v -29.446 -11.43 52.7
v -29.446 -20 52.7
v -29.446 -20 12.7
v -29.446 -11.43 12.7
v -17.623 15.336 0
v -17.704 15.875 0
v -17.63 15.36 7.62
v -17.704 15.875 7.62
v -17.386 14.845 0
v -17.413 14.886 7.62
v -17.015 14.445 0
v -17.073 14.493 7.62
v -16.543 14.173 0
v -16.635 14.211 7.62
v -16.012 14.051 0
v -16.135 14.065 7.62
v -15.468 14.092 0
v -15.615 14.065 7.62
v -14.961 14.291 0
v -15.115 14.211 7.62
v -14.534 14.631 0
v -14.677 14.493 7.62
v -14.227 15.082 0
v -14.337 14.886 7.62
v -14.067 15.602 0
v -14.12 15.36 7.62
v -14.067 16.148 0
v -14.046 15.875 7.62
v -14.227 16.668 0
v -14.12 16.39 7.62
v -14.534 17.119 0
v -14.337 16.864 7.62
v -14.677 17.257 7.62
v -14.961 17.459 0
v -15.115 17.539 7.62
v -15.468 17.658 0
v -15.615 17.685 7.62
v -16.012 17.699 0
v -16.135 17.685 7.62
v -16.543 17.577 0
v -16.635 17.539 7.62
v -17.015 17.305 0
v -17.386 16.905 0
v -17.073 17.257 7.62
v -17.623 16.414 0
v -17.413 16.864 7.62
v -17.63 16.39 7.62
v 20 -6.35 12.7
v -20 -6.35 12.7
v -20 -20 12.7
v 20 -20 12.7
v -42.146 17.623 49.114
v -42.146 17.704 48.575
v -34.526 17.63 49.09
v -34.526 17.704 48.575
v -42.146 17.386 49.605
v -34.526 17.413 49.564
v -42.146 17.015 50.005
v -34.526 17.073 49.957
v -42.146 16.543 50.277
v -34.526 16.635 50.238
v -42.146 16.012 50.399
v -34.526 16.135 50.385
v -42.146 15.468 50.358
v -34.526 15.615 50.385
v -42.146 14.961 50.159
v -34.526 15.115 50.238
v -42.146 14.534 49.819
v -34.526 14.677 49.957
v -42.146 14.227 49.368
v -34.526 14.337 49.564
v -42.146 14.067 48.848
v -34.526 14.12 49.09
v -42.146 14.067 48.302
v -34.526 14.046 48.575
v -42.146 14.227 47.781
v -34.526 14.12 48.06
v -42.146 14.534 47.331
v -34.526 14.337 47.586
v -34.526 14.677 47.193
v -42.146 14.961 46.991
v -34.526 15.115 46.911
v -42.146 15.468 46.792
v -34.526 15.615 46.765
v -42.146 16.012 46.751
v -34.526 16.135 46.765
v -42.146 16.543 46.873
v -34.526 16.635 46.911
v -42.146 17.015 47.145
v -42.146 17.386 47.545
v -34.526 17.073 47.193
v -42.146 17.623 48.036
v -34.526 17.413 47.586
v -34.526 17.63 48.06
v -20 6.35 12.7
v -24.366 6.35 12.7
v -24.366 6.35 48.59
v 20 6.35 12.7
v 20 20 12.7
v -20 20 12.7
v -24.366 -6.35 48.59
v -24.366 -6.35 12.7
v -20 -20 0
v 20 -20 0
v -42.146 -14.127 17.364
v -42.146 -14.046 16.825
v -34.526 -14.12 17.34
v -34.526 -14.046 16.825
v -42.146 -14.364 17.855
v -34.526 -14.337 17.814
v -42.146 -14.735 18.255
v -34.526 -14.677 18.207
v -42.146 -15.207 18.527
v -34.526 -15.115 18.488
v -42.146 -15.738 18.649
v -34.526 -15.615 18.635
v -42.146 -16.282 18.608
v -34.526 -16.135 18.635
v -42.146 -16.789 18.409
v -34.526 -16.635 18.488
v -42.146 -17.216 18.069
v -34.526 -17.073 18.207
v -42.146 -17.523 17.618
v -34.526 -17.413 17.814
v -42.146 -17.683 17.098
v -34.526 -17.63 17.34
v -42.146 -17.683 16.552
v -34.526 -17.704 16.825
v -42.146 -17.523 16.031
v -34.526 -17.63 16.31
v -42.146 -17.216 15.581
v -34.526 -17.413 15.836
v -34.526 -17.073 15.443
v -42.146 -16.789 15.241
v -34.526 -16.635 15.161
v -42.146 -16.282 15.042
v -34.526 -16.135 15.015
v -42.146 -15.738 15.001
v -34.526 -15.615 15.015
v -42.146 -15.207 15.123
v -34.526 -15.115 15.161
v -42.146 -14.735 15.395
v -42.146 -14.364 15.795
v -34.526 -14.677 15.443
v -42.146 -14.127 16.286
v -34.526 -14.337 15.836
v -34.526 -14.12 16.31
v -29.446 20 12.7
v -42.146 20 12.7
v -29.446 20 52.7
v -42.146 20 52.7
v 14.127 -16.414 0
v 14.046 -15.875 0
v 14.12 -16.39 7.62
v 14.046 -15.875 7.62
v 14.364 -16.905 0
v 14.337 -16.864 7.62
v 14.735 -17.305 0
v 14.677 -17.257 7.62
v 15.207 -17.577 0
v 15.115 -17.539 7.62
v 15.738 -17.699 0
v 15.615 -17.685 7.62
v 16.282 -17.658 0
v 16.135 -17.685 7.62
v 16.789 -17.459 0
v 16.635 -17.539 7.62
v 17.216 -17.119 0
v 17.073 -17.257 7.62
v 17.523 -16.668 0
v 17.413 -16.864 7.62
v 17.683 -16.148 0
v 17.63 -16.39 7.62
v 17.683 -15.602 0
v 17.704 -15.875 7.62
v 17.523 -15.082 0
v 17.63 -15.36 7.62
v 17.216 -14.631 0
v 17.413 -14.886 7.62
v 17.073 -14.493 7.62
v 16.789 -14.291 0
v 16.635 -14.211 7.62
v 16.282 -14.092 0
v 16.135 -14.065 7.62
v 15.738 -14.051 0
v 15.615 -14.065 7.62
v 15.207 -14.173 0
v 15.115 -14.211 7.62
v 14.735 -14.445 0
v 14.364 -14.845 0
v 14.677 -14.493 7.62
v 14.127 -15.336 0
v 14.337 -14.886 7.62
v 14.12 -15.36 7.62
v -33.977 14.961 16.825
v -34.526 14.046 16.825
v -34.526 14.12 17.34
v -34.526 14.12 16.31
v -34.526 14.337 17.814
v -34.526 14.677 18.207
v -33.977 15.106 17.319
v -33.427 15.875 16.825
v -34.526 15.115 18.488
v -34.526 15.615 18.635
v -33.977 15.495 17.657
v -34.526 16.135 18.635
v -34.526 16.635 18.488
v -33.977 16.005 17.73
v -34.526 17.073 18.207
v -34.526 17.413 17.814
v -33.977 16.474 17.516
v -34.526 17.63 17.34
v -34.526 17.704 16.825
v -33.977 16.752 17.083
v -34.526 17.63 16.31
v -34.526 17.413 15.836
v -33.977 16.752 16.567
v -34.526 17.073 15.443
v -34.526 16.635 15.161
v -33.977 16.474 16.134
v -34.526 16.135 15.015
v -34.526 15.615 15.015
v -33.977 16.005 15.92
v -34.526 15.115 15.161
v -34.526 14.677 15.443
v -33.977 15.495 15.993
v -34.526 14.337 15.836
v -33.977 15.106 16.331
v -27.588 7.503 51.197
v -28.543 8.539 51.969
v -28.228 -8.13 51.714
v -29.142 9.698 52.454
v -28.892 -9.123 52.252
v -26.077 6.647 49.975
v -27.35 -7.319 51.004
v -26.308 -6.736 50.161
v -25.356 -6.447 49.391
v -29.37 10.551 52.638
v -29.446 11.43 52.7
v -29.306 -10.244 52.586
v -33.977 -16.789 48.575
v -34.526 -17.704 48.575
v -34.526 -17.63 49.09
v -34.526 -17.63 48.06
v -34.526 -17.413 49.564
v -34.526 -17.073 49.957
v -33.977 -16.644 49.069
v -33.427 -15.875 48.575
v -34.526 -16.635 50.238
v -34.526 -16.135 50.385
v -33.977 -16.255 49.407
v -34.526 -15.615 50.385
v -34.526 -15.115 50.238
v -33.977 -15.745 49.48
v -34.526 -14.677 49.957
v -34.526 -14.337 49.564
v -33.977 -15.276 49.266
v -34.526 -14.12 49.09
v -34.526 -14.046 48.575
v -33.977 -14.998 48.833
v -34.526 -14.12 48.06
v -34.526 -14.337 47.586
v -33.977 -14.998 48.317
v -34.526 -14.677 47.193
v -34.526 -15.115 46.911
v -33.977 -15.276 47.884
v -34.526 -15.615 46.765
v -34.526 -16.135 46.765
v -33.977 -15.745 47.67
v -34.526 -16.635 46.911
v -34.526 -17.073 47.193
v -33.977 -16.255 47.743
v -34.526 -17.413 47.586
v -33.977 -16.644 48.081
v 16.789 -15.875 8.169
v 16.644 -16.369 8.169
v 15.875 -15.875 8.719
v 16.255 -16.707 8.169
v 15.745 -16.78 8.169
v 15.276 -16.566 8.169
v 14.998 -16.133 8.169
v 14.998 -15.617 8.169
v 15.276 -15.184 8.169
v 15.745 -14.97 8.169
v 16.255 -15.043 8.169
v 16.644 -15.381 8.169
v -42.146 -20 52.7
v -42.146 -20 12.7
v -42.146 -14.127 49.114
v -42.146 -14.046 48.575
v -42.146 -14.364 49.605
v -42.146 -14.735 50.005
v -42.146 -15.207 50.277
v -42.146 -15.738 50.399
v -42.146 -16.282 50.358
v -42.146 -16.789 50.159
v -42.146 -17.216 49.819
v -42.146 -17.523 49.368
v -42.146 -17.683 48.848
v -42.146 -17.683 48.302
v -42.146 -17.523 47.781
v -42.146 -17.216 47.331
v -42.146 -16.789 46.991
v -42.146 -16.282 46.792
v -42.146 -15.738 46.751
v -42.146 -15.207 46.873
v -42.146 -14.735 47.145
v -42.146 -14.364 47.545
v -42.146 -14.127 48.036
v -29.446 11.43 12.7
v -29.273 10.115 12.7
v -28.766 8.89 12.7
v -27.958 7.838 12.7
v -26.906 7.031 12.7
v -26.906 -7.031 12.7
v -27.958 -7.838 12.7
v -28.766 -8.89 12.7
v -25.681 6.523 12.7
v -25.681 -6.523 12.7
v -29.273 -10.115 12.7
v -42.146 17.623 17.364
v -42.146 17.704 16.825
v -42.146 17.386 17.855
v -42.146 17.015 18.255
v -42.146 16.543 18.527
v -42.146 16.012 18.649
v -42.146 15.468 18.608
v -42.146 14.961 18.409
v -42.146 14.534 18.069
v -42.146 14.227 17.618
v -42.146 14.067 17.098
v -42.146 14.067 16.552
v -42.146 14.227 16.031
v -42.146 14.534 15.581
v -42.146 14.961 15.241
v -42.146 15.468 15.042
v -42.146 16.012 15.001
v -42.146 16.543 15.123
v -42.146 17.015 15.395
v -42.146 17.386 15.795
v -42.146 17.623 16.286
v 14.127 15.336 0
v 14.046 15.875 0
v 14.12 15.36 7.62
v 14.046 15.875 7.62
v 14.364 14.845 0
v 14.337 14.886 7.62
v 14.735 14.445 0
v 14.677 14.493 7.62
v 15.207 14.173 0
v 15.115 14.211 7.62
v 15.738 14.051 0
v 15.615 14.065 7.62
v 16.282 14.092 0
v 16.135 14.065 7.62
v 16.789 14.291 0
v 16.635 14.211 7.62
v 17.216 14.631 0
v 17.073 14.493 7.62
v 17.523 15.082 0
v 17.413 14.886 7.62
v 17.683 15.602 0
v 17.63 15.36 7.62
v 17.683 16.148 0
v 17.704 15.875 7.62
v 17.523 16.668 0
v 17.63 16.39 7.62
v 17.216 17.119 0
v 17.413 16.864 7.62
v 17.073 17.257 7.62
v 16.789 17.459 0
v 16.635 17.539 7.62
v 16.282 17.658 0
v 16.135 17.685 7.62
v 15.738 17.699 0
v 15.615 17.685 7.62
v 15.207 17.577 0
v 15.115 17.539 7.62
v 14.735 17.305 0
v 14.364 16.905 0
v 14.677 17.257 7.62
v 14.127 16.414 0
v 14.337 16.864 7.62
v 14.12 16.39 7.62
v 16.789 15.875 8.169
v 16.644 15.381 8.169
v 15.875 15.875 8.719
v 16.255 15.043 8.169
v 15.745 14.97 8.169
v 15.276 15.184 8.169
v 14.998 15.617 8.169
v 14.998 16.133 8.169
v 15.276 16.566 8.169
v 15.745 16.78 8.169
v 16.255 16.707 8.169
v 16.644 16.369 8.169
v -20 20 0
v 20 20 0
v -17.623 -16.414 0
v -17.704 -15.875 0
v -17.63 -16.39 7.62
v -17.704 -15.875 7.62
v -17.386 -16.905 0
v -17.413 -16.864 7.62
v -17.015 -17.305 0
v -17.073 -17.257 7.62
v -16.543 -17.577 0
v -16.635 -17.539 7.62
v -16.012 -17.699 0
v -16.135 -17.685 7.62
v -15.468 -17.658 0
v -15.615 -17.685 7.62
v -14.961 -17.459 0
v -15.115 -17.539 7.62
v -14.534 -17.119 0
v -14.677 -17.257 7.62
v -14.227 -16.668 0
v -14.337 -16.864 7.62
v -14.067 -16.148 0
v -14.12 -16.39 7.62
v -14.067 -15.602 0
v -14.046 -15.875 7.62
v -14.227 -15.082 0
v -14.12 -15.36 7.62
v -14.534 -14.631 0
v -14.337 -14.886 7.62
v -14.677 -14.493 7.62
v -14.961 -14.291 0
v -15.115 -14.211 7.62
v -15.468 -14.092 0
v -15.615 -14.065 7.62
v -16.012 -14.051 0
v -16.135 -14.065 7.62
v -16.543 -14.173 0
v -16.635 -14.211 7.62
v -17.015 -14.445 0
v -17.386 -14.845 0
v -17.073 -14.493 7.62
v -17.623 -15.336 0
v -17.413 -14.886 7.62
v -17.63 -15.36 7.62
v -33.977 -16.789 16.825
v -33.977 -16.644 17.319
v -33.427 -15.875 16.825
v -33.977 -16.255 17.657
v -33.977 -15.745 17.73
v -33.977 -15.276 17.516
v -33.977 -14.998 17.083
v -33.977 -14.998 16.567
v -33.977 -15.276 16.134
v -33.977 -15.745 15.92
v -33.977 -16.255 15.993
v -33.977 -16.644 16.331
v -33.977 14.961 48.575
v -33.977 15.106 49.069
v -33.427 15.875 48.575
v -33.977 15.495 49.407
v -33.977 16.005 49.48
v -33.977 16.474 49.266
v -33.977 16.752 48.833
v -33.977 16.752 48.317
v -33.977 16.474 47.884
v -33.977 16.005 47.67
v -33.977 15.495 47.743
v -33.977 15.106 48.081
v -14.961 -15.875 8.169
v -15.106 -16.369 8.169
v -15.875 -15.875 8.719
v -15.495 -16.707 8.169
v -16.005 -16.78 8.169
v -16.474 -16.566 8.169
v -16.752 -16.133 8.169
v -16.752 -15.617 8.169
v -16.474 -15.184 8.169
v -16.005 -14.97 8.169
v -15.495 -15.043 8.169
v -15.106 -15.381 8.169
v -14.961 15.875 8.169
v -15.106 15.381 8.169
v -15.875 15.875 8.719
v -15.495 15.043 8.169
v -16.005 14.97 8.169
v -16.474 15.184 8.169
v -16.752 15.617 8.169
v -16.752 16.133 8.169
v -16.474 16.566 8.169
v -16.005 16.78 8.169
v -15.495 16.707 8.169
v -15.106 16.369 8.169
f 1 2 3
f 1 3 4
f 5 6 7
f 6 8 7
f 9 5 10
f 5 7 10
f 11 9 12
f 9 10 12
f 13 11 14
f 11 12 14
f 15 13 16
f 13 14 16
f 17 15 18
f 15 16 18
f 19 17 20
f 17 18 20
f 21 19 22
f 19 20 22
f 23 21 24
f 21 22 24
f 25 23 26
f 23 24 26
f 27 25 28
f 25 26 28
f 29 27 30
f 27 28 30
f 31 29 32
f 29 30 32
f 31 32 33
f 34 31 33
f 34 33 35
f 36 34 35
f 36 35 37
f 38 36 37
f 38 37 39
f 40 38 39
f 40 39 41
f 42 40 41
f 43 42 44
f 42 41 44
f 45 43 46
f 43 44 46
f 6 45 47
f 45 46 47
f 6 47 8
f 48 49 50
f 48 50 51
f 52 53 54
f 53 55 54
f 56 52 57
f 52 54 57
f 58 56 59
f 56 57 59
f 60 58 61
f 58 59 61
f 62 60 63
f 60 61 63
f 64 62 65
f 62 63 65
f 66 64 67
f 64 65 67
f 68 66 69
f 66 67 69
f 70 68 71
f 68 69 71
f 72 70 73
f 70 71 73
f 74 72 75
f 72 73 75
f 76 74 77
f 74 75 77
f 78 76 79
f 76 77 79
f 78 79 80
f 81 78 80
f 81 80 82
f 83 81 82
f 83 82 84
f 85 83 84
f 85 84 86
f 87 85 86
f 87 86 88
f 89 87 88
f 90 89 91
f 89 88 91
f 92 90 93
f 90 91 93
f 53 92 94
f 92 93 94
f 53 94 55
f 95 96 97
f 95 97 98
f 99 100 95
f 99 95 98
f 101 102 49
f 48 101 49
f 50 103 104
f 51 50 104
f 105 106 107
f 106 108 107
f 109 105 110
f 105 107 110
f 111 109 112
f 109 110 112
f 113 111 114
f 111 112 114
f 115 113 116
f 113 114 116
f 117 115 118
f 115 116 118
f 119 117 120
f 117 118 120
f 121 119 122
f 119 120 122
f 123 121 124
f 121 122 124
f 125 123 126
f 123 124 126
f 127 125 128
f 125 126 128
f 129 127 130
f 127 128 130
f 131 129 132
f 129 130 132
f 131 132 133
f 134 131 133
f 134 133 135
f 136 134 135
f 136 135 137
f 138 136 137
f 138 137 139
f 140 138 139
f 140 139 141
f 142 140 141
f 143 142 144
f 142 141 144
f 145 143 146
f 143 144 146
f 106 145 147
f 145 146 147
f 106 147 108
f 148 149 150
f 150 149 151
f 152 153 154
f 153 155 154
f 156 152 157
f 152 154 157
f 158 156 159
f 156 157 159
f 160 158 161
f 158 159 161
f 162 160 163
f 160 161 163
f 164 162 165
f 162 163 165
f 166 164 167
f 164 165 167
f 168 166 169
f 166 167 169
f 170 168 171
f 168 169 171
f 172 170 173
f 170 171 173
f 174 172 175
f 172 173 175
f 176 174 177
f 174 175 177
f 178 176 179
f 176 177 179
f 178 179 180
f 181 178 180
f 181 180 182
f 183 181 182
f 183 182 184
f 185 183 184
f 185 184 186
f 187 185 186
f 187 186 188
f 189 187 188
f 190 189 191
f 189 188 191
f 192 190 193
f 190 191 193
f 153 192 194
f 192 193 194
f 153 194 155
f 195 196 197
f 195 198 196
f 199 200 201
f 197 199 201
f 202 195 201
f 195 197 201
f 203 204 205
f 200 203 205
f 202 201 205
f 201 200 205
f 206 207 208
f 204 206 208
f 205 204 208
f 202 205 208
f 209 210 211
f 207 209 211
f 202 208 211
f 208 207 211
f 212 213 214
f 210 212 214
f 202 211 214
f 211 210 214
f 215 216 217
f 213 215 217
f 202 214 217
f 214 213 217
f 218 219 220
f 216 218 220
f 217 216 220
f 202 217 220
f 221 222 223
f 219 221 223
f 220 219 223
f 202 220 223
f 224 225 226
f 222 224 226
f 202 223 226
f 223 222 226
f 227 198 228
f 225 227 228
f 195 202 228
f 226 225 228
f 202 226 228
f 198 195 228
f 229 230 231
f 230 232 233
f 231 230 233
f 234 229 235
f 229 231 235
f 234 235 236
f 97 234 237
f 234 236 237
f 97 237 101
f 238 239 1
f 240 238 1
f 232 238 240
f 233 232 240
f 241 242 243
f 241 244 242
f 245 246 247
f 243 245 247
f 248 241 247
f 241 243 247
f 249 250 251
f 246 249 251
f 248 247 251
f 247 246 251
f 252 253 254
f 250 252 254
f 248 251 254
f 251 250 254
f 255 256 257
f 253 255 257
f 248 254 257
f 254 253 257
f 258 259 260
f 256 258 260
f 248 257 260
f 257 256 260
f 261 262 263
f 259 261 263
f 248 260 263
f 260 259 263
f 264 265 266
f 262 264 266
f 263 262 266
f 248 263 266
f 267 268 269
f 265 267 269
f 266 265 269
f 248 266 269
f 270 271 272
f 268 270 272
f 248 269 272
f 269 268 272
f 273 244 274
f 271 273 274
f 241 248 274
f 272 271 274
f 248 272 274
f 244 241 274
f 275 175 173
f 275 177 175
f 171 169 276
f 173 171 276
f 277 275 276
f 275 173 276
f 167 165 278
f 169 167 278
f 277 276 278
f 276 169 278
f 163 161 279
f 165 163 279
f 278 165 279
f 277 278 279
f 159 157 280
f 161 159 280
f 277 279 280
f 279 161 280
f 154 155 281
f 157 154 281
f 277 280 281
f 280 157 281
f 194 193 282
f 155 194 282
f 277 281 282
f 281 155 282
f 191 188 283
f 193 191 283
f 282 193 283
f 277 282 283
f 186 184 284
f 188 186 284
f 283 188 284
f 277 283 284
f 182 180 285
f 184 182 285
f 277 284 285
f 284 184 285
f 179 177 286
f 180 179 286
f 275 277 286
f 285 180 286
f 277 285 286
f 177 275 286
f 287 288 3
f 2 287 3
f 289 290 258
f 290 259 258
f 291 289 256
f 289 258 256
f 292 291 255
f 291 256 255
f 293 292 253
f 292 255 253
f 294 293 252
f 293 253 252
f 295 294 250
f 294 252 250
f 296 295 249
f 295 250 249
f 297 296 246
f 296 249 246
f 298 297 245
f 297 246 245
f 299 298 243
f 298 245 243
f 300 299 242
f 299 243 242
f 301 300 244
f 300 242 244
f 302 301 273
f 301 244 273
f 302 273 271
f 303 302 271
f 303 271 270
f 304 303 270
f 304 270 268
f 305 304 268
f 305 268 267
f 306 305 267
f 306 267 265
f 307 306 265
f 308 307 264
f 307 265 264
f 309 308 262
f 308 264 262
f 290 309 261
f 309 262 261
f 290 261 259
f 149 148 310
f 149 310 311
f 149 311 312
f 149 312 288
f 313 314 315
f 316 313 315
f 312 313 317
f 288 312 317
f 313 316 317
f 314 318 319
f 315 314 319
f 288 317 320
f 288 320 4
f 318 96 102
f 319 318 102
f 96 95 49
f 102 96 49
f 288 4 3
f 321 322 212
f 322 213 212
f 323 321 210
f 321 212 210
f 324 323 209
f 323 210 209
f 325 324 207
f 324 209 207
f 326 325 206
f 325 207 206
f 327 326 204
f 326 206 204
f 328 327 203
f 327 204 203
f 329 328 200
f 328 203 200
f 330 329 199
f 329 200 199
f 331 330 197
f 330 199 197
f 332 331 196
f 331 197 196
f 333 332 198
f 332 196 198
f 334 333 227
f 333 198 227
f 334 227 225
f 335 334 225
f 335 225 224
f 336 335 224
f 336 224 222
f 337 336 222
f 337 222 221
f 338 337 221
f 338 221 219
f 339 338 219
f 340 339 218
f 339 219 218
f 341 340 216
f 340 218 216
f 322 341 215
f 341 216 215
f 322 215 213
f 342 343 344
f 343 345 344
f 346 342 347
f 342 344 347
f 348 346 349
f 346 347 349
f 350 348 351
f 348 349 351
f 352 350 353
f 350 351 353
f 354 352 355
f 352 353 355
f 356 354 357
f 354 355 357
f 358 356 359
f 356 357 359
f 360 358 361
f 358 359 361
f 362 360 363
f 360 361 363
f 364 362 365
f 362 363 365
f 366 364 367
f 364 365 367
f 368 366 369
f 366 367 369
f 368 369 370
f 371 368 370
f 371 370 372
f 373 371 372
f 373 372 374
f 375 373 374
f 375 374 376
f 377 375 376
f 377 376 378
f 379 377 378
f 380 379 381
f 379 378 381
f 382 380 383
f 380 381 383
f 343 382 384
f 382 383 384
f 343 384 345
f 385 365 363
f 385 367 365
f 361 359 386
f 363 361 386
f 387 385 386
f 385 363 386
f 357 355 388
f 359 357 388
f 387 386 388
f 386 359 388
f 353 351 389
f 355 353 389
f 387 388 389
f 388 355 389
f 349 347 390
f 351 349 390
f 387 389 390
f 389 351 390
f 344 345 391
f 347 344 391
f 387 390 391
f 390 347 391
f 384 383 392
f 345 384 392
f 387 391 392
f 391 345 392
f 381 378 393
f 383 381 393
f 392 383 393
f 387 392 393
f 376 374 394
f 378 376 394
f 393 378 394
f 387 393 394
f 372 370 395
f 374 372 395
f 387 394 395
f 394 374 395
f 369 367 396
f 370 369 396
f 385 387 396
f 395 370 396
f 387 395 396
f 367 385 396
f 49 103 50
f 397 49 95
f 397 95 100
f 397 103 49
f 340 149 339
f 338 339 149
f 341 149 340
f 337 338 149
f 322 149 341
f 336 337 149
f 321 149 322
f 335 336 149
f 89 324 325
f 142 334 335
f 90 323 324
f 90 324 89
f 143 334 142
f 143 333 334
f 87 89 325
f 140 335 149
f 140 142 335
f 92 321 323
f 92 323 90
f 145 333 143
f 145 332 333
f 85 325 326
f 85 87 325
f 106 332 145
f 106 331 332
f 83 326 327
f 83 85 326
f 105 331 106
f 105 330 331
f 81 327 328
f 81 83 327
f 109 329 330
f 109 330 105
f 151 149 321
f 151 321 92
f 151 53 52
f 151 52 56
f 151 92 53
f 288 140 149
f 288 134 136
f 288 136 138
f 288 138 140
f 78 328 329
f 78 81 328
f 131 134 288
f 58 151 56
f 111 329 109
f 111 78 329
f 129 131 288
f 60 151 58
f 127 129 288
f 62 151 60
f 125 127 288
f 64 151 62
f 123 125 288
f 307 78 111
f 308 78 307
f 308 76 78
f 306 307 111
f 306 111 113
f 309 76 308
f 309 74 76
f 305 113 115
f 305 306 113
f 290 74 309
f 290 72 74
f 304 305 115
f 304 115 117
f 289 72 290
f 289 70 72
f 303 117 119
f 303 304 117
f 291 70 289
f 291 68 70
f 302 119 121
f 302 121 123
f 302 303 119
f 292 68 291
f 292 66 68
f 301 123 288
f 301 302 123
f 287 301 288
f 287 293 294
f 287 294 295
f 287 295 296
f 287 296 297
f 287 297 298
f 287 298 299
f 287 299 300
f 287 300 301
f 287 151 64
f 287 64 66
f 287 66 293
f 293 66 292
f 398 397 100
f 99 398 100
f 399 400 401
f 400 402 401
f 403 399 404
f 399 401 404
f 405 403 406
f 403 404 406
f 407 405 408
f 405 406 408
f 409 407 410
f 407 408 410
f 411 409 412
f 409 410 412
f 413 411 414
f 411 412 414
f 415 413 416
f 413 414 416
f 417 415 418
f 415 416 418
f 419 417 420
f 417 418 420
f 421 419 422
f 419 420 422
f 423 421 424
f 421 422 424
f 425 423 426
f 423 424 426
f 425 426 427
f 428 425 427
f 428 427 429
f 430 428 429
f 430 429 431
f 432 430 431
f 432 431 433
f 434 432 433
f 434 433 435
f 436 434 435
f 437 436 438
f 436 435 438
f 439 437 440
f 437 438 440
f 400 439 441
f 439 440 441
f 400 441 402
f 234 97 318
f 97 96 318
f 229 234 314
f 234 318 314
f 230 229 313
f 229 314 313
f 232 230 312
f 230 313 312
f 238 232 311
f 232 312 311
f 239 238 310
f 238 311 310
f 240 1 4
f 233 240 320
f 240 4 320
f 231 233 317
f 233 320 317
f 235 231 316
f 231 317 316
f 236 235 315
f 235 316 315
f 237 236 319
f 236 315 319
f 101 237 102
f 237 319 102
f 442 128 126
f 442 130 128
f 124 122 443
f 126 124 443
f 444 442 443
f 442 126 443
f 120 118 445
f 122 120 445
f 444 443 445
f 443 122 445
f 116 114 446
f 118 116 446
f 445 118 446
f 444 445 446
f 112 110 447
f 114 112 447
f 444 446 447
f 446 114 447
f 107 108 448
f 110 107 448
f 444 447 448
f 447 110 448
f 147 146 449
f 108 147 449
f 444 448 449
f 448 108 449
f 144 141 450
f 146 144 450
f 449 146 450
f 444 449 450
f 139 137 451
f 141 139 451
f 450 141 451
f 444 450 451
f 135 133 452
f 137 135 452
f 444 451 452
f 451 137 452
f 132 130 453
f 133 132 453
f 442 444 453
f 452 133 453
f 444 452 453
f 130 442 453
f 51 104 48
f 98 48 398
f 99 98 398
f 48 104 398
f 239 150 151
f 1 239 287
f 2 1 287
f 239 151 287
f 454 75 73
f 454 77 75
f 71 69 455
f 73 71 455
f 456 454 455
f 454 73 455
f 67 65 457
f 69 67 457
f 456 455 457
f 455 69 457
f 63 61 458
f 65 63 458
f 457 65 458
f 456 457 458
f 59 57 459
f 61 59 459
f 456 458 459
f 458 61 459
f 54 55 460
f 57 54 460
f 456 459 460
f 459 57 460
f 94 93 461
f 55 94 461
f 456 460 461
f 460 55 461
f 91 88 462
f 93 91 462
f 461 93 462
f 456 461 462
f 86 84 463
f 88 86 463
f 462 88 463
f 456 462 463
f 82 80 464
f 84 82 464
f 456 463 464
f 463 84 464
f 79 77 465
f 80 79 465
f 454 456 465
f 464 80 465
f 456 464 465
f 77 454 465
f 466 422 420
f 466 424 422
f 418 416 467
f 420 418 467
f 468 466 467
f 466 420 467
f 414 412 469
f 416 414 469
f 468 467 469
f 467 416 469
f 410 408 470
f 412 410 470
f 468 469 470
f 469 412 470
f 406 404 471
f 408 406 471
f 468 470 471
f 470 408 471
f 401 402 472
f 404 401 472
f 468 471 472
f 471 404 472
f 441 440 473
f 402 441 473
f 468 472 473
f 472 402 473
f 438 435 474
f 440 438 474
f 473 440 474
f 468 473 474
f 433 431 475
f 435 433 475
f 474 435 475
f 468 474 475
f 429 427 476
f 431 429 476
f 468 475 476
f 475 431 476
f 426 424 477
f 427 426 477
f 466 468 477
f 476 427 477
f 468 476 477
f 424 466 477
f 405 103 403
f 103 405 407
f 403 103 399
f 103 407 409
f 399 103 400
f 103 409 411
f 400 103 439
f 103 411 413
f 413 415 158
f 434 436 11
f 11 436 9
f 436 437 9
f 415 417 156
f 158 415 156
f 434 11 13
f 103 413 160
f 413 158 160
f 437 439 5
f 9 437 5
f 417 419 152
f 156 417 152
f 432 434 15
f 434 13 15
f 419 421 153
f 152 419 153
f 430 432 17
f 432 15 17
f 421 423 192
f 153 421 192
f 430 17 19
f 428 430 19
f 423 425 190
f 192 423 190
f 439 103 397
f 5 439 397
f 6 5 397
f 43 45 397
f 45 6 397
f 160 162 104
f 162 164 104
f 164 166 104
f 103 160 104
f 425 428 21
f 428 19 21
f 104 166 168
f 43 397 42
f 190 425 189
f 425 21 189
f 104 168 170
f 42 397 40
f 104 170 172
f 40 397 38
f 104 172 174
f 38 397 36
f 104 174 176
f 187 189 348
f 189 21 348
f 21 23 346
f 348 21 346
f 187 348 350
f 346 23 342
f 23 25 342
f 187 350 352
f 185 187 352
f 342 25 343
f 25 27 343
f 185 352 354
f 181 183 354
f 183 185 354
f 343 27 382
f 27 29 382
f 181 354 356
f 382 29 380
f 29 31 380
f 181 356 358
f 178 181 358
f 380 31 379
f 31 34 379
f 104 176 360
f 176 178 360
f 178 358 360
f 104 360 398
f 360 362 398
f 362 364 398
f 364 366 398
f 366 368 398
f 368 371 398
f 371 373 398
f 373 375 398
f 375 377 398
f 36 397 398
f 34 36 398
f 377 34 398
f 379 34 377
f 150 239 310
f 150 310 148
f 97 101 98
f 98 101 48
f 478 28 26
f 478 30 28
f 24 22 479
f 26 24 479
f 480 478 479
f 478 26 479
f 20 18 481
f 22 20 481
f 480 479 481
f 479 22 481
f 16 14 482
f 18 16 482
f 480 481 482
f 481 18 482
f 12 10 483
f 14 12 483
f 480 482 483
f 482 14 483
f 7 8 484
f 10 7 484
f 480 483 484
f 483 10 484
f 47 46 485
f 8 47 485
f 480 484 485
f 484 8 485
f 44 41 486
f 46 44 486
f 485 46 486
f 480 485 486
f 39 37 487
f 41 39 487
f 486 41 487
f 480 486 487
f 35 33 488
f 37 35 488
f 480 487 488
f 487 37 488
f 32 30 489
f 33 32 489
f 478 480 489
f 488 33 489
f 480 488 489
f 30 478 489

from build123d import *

# Parameters (mm, degrees)
F0_W          = 39.99992
F0_H          = 39.99992
F1_DEPTH      = 12.7
F3_D          = 3.6576
F3_DEPTH      = 7.62
F3_TIP        = 1.0988539001
F4_W          = 39.99992
F4_H          = 12.7
F5_DEPTH      = 39.99992
F6_W          = 39.99992
F6_H          = 39.99992
F7_DEPTH      = 22.14626
F7_DEPTH_BACK = 3.048
F8_W          = 12.49426
F8_H          = 13.64996
F9_DEPTH      = 39.99992
F10_R         = 5.08
F12_D         = 3.6576
F12_DEPTH     = 7.62
F12_TIP       = 1.0988539001
F14_DEPTH     = 25.4


with BuildPart() as f1:
    # F0 (on Top) → F1 (new body)
    with BuildSketch(Plane.XY):
        Rectangle(F0_W, F0_H)
    extrude(amount=F1_DEPTH)

    # F3
    with Locations(Plane(origin=(0, 0, 0), x_dir=(1, 0, 0), z_dir=(0, 0, -1))):
        with Locations((-15.875, -15.875), (15.875, -15.875), (15.875, 15.875), (-15.875, 15.875)):
            Hole(F3_D / 2, depth=F3_DEPTH)
            with Locations((0, 0, -(F3_DEPTH + F3_TIP / 2))):  # 118° drill point
                Cone(0, F3_D / 2, F3_TIP, mode=Mode.SUBTRACT)

    # F4 (on face) → F5 (join)
    with BuildSketch(Plane.XY.offset(12.7)):
        Rectangle(F4_W, F4_H)
    extrude(amount=F5_DEPTH)

    # F6 (on face) → F7 (join, two sides)
    with BuildSketch(Plane(origin=(-19.99996, 0, 0), x_dir=(0, -1, 0), z_dir=(-1, 0, 0))) as f7_sk:
        with Locations((0, 32.69996)):
            Rectangle(F6_W, F6_H)
    extrude(amount=F7_DEPTH)
    extrude(f7_sk.sketch, amount=-F7_DEPTH_BACK)

    # F8 (on face) → F9 (cut)
    with BuildSketch(Plane.XY.offset(52.69992)):
        with Locations((-23.19909, 13.17498)):
            Rectangle(F8_W, F8_H)
        with Locations((-23.19909, -13.17498)):
            Rectangle(F8_W, F8_H)
    extrude(amount=-F9_DEPTH, mode=Mode.SUBTRACT)

    # F10
    f10_edges = [f1.edges().sort_by_distance(p)[0] for p in [
        (-29.44622, -6.35, 32.69996),
        (-29.44622, 6.35, 32.69996),
    ]]
    fillet(f10_edges, radius=F10_R)

    # F12
    with Locations(Plane(origin=(-42.14622, 0, 0), x_dir=(0, -1, 0), z_dir=(-1, 0, 0))):
        with Locations((-15.875, 48.57496), (15.875, 48.57496), (15.875, 16.82496), (-15.875, 16.82496)):
            Hole(F12_D / 2, depth=F12_DEPTH)
            with Locations((0, 0, -(F12_DEPTH + F12_TIP / 2))):  # 118° drill point
                Cone(0, F12_D / 2, F12_TIP, mode=Mode.SUBTRACT)

    # F13 (on face) → F14 (cut, symmetric)
    with BuildSketch(Plane.XZ.offset(6.35)):
        Polygon((-29.44622, 52.69992), (-24.36622, 48.5904095464), (-24.36622, 52.69992), align=None)
        Polygon((-24.36622, 48.5904095464), (19.99996, 12.7), (19.99996, 52.69992), (-24.36622, 52.69992), align=None)
    extrude(amount=F14_DEPTH, both=True, mode=Mode.SUBTRACT)


solid = f1.part
